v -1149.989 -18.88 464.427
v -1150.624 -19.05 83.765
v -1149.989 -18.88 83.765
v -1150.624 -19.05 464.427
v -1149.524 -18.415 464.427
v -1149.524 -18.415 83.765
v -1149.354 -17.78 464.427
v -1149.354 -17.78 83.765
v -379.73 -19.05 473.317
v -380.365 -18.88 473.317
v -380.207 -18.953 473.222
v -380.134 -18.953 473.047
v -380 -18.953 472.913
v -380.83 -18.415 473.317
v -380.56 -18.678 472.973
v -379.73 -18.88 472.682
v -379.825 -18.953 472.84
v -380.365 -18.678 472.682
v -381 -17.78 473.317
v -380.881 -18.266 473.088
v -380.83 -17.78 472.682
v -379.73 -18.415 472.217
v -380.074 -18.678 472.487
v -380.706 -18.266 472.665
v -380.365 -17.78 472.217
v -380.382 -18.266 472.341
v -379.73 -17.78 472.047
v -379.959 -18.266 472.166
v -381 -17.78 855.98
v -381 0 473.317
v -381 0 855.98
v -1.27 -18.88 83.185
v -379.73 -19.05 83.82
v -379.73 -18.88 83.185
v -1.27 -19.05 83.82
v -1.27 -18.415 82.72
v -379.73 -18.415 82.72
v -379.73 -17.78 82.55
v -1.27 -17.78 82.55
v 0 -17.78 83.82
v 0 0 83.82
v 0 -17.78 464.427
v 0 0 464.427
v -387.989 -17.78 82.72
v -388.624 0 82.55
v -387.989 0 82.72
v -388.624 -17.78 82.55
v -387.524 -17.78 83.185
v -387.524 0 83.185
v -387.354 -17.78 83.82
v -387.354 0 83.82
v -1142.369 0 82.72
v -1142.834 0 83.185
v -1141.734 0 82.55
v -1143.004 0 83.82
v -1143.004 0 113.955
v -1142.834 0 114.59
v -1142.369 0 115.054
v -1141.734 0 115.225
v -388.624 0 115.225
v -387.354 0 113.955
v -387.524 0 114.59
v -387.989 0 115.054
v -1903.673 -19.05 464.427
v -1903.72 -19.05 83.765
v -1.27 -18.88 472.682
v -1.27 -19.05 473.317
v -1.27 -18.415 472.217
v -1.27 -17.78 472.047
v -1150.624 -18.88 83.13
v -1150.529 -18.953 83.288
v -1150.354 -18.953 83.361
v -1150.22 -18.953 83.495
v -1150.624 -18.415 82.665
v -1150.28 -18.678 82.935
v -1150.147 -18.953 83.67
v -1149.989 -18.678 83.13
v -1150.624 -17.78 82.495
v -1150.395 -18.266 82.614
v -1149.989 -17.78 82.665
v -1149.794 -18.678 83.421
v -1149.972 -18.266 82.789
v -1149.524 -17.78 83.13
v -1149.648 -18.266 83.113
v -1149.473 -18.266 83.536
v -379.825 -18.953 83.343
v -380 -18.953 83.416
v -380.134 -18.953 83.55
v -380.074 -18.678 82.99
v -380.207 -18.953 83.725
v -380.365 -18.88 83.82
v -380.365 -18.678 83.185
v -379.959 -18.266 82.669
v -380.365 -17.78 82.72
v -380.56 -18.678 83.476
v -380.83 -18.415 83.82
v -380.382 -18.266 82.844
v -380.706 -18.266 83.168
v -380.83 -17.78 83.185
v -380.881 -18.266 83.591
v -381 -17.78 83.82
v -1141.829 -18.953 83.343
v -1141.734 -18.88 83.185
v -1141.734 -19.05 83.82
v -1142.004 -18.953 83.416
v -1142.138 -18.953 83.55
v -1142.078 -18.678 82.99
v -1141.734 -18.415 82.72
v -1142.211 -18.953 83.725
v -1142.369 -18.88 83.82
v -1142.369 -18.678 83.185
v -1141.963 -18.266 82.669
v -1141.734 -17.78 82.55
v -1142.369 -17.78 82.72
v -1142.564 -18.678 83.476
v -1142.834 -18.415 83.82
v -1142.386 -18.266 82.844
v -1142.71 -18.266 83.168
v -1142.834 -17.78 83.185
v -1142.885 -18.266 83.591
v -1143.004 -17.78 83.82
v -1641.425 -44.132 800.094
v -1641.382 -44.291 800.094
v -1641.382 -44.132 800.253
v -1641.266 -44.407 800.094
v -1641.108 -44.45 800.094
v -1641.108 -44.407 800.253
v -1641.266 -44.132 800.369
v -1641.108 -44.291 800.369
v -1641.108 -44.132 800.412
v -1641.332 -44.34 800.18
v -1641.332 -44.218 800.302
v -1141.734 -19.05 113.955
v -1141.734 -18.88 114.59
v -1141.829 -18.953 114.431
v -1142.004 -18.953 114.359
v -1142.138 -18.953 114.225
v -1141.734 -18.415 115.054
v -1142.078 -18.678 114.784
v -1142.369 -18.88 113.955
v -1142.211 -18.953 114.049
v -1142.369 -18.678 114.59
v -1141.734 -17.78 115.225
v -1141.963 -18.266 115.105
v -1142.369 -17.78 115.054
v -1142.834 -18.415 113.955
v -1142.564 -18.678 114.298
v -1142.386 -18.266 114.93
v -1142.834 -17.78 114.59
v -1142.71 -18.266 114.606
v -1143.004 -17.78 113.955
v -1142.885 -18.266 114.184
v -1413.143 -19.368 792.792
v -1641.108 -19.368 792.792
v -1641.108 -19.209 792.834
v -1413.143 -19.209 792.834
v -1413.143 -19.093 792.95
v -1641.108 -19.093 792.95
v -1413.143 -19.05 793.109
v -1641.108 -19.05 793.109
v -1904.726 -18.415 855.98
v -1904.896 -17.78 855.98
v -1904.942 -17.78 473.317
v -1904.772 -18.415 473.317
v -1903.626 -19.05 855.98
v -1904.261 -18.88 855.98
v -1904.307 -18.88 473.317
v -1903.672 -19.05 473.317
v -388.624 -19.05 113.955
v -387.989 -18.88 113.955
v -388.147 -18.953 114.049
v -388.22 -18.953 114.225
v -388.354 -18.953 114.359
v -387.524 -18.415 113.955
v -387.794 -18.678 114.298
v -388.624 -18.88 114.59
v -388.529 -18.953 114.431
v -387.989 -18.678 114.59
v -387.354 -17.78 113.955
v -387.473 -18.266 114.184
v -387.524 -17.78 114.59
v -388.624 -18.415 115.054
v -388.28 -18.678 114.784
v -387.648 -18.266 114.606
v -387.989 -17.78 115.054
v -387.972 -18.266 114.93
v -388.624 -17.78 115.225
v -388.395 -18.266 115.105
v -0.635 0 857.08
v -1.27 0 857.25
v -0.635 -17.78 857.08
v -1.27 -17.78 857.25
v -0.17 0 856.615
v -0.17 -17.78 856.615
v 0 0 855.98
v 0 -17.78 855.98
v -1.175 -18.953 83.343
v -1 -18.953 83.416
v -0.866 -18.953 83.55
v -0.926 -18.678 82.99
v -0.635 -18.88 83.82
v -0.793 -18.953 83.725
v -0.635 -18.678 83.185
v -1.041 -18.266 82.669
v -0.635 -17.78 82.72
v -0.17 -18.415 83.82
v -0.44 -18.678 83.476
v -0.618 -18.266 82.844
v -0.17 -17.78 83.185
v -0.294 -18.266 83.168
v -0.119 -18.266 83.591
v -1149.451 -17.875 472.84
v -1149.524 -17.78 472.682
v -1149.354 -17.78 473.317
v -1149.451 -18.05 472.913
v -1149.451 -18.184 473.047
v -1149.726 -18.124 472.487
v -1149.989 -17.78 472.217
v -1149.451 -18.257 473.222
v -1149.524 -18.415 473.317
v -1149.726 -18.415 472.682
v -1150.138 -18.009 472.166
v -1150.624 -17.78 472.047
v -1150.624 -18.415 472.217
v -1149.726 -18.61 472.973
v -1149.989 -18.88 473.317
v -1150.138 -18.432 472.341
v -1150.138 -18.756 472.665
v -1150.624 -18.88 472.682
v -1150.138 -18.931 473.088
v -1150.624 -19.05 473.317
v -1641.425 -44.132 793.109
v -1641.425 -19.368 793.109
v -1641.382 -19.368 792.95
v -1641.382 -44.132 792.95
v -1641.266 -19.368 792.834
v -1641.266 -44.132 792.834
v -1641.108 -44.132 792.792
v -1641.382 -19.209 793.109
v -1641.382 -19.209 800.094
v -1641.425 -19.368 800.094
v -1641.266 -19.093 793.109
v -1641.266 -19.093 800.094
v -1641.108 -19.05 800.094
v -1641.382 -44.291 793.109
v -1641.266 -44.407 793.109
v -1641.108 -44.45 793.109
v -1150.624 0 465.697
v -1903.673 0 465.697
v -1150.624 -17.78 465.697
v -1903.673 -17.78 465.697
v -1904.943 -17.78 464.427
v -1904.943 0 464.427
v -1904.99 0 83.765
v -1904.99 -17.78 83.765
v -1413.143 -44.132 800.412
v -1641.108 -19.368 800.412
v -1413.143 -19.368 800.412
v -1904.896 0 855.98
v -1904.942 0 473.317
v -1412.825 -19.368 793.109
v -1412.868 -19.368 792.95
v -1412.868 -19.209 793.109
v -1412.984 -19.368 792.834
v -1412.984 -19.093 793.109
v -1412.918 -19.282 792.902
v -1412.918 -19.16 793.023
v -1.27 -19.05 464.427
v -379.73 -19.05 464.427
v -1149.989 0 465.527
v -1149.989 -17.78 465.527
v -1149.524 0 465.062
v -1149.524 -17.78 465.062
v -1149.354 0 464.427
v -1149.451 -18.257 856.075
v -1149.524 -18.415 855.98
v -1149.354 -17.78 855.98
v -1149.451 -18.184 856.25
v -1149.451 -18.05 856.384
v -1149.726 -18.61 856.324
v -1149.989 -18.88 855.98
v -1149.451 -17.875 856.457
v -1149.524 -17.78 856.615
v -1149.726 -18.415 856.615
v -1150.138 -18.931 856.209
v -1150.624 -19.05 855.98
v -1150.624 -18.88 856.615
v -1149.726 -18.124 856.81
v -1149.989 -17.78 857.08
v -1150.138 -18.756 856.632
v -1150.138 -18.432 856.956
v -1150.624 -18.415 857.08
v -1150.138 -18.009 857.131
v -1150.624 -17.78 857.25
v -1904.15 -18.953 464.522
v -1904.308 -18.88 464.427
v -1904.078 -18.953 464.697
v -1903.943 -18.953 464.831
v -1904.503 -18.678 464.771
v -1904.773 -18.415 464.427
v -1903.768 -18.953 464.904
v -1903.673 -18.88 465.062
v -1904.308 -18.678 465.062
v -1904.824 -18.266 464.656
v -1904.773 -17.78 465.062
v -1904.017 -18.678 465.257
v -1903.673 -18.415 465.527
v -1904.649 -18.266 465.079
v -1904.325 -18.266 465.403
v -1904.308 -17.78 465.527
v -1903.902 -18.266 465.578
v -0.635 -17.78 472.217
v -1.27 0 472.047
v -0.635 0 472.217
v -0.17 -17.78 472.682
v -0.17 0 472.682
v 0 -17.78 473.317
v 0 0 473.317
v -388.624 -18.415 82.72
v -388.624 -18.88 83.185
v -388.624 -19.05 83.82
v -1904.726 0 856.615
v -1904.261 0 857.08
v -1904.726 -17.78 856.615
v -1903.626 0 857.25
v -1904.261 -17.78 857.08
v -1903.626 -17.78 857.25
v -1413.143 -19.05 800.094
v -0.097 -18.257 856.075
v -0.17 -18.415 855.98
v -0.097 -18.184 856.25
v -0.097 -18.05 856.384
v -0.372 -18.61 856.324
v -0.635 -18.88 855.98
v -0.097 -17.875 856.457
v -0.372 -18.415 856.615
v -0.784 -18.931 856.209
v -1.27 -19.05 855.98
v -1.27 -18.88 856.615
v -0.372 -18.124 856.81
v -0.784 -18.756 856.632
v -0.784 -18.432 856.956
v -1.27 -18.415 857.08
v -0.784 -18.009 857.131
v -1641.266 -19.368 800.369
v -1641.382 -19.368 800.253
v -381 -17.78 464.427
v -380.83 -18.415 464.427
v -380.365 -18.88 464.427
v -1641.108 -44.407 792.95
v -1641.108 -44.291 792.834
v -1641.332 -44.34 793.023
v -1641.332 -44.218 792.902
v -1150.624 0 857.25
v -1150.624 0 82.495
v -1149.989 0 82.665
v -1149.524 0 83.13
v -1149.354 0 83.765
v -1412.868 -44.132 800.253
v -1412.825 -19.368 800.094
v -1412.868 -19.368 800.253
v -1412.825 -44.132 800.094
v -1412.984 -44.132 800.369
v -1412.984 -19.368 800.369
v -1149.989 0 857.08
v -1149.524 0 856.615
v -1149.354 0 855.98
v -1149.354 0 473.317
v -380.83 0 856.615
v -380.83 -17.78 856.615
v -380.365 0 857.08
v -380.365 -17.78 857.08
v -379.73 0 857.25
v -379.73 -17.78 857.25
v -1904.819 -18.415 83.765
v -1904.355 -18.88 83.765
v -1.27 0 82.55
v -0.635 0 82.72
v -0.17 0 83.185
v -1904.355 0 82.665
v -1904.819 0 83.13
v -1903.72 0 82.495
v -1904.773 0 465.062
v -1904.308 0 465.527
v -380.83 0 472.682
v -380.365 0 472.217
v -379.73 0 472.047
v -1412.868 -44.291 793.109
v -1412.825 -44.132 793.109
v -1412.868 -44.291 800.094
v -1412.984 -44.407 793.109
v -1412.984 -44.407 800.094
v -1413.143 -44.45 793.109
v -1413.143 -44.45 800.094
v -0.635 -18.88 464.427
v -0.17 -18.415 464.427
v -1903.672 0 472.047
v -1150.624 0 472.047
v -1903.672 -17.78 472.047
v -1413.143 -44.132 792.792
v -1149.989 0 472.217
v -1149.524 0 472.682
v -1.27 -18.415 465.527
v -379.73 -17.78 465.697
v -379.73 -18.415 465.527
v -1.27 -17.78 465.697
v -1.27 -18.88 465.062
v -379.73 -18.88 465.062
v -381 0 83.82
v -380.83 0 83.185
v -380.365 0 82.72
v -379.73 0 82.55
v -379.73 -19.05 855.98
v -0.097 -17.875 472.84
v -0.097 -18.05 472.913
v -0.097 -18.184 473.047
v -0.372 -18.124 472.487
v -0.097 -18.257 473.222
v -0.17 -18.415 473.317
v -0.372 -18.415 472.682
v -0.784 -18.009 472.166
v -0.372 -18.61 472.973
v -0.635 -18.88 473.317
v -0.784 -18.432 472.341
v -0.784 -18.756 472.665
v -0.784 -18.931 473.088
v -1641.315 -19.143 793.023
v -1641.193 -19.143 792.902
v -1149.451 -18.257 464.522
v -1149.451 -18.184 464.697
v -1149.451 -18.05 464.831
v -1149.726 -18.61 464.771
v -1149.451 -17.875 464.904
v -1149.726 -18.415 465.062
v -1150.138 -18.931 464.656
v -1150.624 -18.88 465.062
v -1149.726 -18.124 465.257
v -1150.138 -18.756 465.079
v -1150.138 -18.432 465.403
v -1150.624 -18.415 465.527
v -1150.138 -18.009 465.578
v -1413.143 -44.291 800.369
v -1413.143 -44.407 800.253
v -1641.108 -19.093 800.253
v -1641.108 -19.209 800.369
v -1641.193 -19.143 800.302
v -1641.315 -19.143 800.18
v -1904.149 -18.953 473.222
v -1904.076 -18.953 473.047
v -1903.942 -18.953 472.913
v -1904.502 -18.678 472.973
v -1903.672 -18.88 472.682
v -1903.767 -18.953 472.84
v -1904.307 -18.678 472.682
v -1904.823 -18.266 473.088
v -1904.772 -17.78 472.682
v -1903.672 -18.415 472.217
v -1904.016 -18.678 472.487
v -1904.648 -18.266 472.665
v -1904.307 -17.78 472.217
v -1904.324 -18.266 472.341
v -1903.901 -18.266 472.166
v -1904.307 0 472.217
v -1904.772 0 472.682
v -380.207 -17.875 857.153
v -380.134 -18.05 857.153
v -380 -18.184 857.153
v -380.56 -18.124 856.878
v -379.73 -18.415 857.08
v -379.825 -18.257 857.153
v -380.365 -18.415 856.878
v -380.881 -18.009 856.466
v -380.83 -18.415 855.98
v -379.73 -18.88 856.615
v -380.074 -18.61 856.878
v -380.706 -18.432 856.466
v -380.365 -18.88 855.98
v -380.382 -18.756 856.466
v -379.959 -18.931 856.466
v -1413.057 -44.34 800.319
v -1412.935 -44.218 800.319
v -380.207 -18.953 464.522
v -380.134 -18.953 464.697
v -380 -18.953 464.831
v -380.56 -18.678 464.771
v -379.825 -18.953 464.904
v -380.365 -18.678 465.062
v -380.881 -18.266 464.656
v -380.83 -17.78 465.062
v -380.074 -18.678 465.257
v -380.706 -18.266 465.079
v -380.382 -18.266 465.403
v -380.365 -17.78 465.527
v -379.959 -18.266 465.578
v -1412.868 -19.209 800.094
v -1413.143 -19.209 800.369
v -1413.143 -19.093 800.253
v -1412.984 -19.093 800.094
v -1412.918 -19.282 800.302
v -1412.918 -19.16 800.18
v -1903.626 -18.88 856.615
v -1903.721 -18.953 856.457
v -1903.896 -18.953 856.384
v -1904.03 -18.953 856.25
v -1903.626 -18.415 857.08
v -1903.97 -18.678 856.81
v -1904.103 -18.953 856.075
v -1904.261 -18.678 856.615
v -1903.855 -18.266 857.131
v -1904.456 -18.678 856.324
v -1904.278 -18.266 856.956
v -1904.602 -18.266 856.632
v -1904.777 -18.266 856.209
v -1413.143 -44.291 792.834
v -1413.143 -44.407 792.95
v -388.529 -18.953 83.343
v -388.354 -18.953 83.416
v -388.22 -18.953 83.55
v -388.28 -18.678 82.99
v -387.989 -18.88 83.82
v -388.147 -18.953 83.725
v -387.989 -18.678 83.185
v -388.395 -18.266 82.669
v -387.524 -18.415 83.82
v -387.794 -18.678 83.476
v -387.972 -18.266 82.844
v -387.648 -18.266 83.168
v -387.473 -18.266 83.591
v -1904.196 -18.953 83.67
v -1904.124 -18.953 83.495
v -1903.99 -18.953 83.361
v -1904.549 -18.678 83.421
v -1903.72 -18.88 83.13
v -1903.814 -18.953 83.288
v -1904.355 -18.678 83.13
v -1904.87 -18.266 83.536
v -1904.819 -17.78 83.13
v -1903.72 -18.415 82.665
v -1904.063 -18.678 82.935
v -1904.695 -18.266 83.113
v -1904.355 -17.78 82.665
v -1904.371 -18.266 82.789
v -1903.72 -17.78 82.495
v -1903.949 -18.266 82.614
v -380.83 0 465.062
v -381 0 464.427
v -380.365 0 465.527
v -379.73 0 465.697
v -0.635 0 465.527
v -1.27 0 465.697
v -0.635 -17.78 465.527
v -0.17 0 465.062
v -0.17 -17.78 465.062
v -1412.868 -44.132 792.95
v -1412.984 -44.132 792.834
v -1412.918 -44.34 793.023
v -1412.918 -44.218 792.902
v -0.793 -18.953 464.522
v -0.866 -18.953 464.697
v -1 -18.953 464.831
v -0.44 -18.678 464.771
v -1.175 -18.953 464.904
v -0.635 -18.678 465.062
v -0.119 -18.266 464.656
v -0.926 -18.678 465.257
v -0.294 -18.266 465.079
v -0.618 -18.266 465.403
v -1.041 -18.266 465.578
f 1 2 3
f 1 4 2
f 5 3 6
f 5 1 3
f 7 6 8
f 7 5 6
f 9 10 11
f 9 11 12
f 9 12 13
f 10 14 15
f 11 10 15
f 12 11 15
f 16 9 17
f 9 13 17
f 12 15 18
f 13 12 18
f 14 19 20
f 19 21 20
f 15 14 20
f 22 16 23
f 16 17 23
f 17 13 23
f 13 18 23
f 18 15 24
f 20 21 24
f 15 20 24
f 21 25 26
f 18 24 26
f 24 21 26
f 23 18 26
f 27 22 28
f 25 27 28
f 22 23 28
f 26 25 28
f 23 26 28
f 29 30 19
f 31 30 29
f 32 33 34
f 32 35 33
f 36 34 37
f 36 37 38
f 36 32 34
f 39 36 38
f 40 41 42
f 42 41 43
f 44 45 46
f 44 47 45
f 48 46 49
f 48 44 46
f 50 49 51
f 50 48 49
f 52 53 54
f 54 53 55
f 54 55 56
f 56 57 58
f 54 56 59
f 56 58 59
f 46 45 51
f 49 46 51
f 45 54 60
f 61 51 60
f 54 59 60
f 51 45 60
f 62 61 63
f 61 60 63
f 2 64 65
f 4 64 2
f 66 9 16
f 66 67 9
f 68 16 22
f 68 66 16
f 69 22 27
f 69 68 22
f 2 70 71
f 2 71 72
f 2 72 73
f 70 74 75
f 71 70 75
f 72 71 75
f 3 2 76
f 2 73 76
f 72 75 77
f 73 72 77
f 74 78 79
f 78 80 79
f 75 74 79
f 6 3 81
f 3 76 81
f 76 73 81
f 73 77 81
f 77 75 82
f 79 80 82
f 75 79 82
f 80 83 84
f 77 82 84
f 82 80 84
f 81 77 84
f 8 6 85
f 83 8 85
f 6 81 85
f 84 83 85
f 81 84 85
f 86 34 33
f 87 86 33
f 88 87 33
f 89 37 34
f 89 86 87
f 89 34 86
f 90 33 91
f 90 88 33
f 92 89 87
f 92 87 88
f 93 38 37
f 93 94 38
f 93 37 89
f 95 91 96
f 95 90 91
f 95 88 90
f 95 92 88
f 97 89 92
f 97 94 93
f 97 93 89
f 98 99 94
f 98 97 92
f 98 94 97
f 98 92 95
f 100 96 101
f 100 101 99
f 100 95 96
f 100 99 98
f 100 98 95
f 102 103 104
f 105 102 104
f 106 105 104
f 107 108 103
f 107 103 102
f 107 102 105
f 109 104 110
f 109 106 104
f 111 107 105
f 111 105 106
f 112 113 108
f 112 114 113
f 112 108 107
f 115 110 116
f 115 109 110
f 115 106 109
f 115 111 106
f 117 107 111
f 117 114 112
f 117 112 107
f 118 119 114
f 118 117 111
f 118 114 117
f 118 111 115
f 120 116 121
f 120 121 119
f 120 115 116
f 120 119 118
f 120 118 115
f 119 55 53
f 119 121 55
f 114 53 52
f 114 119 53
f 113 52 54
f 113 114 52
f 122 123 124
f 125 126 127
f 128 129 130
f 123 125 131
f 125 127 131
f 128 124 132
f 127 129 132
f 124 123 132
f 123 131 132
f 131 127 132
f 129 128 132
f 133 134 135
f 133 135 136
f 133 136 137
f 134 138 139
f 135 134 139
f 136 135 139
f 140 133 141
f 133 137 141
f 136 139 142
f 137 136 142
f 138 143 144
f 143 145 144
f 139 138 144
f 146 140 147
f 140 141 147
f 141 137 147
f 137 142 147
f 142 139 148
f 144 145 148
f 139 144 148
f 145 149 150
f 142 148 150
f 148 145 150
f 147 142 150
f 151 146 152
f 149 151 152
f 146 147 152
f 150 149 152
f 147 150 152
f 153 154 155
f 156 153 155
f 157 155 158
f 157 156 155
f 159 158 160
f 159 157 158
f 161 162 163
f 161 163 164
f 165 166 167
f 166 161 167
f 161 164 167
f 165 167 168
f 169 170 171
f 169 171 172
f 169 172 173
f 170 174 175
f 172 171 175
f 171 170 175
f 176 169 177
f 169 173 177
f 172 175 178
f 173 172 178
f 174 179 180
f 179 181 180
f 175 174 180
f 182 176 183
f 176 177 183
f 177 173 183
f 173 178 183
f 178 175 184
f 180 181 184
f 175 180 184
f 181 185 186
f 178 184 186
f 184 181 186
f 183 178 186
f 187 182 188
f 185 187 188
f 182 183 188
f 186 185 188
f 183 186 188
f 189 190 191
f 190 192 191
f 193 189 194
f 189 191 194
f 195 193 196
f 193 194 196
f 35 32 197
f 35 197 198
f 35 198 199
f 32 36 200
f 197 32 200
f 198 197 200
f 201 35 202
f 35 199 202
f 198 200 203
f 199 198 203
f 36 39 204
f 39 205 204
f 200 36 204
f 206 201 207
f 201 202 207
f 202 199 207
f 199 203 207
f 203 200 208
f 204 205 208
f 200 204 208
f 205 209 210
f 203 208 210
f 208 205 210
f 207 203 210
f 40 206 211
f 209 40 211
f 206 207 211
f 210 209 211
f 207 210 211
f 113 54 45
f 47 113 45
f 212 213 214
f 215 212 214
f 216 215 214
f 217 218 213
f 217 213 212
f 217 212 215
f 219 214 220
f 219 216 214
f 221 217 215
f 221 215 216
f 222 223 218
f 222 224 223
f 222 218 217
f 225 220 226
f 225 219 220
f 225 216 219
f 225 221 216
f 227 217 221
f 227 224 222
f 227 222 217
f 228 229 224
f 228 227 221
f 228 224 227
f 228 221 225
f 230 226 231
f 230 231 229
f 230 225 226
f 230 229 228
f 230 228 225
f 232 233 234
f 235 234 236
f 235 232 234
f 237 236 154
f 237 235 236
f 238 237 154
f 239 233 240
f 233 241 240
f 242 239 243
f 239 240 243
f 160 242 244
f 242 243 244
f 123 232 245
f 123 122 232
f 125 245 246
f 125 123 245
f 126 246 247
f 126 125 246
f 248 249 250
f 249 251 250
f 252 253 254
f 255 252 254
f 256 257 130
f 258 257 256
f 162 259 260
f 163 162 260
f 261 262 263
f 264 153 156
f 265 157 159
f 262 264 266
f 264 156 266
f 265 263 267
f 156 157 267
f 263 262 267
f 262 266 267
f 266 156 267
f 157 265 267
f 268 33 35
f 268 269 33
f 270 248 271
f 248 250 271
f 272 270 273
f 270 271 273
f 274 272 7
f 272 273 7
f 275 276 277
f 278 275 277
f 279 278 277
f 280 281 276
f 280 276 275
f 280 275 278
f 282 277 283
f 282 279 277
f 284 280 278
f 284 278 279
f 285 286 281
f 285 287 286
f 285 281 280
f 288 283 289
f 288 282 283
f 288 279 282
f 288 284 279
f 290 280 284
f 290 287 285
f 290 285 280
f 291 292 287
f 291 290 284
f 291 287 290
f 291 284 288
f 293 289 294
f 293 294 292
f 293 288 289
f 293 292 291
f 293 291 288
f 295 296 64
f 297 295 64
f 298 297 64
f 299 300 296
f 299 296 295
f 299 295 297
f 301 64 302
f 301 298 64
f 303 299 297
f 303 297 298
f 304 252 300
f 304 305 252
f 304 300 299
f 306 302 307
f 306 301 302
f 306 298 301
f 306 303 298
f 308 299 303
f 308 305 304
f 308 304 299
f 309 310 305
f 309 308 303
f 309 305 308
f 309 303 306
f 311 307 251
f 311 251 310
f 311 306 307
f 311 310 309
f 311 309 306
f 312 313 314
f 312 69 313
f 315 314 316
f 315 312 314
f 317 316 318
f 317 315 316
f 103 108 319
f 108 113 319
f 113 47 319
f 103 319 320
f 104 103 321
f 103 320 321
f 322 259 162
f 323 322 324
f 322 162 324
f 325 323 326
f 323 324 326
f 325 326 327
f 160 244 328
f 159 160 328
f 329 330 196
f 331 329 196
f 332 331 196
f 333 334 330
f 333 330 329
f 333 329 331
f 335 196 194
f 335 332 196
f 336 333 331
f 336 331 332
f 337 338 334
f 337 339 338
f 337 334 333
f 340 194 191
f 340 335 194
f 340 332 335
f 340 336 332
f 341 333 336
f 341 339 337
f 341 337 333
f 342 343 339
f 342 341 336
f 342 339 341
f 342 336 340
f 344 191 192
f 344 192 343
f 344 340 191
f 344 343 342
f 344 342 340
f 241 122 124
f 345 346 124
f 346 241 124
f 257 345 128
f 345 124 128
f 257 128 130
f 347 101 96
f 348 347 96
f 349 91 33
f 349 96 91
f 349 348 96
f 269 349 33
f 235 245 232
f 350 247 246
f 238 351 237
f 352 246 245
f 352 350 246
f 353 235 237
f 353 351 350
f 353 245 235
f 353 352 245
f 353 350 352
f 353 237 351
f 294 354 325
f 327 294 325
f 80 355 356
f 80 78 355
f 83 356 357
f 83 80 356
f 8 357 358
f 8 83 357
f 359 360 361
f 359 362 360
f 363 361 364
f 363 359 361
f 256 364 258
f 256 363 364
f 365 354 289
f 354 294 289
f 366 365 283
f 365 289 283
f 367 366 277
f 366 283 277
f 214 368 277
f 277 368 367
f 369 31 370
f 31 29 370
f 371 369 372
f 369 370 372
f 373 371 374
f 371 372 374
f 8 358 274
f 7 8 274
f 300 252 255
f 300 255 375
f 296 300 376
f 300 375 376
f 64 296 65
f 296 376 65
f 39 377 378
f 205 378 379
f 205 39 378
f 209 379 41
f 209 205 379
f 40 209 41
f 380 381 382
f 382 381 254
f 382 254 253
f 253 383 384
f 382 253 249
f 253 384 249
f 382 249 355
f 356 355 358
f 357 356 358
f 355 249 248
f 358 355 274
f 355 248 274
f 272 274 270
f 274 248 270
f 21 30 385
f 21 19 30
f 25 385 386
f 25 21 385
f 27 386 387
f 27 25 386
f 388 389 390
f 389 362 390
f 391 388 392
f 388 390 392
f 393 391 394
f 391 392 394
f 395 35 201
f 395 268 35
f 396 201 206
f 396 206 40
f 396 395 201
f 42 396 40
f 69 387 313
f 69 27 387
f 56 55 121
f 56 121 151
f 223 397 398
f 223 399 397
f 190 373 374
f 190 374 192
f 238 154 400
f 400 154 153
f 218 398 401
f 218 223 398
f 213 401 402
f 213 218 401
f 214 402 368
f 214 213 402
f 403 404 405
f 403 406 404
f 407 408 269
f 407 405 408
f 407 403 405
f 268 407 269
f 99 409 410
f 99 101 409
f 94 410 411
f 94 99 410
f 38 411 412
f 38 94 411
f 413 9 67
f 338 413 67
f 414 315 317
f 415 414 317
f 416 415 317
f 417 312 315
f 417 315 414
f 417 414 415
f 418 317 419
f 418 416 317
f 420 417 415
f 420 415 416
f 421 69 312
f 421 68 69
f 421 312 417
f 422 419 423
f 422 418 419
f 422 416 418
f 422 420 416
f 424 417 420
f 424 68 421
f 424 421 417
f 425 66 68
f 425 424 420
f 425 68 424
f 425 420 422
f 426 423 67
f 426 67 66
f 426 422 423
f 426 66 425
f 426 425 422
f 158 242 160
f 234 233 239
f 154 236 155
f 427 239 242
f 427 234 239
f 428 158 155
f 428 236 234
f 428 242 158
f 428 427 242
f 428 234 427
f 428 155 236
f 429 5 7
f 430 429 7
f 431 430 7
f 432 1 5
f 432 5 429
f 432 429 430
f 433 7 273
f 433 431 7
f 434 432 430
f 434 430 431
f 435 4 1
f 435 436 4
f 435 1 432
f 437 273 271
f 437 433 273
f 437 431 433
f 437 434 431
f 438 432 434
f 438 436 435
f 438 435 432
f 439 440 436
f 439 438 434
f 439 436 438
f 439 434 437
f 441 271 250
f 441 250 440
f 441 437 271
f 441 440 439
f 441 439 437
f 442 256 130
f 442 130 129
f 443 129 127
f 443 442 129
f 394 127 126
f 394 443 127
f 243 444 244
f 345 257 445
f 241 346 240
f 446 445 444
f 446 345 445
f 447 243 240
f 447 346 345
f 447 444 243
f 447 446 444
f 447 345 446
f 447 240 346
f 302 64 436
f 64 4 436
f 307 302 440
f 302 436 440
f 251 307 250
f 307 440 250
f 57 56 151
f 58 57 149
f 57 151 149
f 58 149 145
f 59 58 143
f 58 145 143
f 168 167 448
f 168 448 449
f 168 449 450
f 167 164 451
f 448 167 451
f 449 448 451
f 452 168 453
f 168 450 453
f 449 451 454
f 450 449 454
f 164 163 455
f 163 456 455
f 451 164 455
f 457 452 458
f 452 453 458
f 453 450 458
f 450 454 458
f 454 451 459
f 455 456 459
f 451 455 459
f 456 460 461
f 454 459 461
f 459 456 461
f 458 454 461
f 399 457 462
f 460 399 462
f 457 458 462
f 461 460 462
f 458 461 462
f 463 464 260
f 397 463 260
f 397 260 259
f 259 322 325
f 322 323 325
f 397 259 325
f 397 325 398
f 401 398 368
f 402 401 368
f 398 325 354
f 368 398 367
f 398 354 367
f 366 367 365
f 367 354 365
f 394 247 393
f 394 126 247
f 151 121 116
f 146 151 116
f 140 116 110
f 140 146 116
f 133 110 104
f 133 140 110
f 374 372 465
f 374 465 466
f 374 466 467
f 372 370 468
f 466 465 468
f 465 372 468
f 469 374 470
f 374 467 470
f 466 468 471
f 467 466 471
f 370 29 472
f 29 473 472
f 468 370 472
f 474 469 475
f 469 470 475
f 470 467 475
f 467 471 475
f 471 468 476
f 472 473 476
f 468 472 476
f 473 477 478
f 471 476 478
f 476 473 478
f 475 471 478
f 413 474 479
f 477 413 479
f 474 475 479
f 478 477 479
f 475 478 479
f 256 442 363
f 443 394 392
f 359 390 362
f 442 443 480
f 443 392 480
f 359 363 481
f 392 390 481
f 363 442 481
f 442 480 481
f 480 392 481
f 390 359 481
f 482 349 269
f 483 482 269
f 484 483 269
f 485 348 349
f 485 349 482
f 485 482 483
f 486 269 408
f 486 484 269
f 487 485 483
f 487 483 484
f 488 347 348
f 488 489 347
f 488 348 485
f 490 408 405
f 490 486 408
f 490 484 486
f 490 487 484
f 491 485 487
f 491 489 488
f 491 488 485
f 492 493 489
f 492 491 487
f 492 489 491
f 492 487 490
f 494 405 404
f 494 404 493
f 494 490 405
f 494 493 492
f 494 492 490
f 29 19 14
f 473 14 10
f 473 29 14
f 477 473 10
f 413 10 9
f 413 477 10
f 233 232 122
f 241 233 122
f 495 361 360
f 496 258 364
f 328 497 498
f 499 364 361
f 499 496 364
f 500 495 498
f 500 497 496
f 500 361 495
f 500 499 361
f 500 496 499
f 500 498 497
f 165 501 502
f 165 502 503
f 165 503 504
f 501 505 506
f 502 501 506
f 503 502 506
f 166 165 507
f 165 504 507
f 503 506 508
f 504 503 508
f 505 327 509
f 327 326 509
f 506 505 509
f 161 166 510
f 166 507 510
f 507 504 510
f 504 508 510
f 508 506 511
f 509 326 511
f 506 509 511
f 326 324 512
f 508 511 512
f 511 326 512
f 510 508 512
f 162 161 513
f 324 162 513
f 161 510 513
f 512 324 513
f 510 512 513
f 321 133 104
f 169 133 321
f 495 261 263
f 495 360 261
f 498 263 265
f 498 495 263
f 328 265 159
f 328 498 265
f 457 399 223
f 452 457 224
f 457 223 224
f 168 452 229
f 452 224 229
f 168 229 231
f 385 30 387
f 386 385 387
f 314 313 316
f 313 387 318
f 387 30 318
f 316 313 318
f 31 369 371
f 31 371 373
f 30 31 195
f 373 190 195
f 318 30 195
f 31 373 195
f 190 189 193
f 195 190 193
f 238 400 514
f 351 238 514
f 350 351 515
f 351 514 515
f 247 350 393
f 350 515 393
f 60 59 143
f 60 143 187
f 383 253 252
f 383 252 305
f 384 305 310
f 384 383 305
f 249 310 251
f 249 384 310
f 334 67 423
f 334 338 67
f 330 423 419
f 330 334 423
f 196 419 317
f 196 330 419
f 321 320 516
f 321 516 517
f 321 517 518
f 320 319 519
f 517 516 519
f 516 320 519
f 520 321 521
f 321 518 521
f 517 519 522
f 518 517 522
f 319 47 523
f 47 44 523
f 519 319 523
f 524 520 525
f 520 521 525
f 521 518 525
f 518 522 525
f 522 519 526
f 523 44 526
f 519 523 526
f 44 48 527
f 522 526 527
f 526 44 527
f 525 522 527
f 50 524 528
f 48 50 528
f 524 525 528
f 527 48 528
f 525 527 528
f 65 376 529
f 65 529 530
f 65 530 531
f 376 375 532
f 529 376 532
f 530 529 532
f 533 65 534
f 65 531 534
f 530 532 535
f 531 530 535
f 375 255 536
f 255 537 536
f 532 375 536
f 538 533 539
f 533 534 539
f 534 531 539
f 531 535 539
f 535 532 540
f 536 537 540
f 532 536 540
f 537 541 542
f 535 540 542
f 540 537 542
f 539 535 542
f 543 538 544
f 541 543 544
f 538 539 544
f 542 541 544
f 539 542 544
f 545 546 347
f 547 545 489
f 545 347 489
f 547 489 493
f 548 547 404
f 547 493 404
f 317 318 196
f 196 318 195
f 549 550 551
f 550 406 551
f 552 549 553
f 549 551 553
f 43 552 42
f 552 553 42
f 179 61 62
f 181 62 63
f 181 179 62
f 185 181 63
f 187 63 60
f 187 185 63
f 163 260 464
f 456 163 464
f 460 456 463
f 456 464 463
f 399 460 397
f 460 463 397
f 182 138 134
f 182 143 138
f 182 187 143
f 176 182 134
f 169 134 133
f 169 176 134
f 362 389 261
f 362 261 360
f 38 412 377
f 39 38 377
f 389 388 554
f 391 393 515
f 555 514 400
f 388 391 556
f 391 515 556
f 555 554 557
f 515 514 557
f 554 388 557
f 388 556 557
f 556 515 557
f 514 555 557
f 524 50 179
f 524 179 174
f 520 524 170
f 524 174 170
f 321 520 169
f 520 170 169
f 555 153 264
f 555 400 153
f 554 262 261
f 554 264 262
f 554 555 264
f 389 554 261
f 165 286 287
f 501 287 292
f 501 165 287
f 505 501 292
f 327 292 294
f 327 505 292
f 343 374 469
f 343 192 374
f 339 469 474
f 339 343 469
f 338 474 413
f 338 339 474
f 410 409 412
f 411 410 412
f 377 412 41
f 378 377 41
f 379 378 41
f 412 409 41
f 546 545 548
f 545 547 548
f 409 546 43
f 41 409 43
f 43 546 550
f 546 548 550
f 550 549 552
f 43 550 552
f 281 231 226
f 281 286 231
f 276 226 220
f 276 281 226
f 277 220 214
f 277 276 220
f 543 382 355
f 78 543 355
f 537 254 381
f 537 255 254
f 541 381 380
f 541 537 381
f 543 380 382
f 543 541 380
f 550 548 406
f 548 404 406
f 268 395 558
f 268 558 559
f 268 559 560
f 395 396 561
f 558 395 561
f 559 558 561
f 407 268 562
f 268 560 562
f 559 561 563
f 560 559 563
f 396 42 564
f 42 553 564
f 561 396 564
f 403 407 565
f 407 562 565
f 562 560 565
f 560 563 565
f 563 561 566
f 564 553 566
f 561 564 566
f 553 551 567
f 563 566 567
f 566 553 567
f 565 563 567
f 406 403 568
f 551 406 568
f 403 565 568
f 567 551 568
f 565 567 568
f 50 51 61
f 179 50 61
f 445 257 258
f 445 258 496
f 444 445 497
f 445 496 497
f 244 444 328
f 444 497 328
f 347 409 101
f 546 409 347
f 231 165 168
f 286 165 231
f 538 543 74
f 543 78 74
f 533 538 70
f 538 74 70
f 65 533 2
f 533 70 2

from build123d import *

# Parameters (mm, degrees)
F0_W     = 381
F0_H     = 774.7
F1_DEPTH = 19.05
F0_W_2   = 755.65
F0_H_2   = 32.6746147394
F3_W     = 228.6
F3_H     = 7.62
F4_DEPTH = 25.4
F5_R     = 0.3175
F6_W     = 2032
F6_H     = 6.35
F7_DEPTH = 25.4
F8_R     = 1.27
F8_2_R   = 1.27
F8_3_R   = 1.27


# Not quite as in the source:
# - a feature of the source that left no trace in its solid (it failed there, or was rolled back) is left out


with BuildPart() as f1:
    # F0 (on Front) → F1 (new body)
    with BuildSketch(Plane.XZ):
        with Locations((-190.5, 469.9)):
            Rectangle(F0_W, F0_H)
    extrude(amount=F1_DEPTH)


with BuildPart() as f1b:
    # F0 (on Front) → F1, piece 2 (new body)
    with BuildSketch(Plane.XZ):
        Polygon((-1904.895815666, 857.25), (-1904.9897383738, 82.4946576853), (-1149.3540530003, 82.4946576853), (-1149.3540530003, 82.55), (-1149.3540530003, 857.25), (-1527.1790530003, 857.25), align=None)
    extrude(amount=F1_DEPTH)


with BuildPart() as f1c:
    # F0 (on Front) → F1, piece 3 (new body)
    with BuildSketch(Plane.XZ):
        with Locations((-765.1790530003, 98.8873073697)):
            Rectangle(F0_W_2, F0_H_2)
    extrude(amount=F1_DEPTH)

    # F8#3
    f8_3_edges = [f1c.edges().sort_by_distance(p)[0] for p in [
        (-1143.004053, -9.525, 82.55),
        (-387.354053, -9.525, 82.55),
        (-765.179053, -19.05, 82.55),
        (-387.354053, -9.525, 115.224615),
        (-387.354053, -19.05, 98.887307),
        (-1143.004053, -9.525, 115.224615),
        (-765.179053, -19.05, 115.224615),
        (-1143.004053, -19.05, 98.887307),
    ]]
    fillet(f8_3_edges, radius=F8_3_R)


with BuildPart() as f4:
    # F3 (on face) → F4 (new body)
    with BuildSketch(Plane.XZ.offset(19.05)):
        with Locations((-1527.1250113088, 796.6017127037)):
            Rectangle(F3_W, F3_H)
    extrude(amount=F4_DEPTH)

    # F5
    f5_edges = [f4.edges().sort_by_distance(p)[0] for p in [
        (-1527.125011, -44.45, 792.791713),
        (-1412.825011, -44.45, 796.601713),
        (-1527.125011, -44.45, 800.411713),
        (-1641.425011, -44.45, 796.601713),
        (-1641.425011, -31.75, 800.411713),
        (-1641.425011, -31.75, 792.791713),
        (-1527.125011, -19.05, 800.411713),
        (-1641.425011, -19.05, 796.601713),
        (-1527.125011, -19.05, 792.791713),
        (-1412.825011, -31.75, 792.791713),
        (-1412.825011, -31.75, 800.411713),
        (-1412.825011, -19.05, 796.601713),
    ]]
    fillet(f5_edges, radius=F5_R)


with BuildPart() as f7_tool:
    # F6 (on face) → F7 (new body)
    with BuildSketch(Plane.XZ.offset(19.05)):
        with Locations((-895.2655443497, 468.8719840575)):
            Rectangle(F6_W, F6_H)
    extrude(amount=-F7_DEPTH)


with BuildPart() as f1_1:
    add(f1.part)

    # F7: cut by f7_tool
    add(f7_tool.part, mode=Mode.SUBTRACT)

    # F8
    f8_edges = [f1_1.edges().sort_by_distance(p)[0] for p in [
        (-381, -9.525, 472.046984),
        (-381, -9.525, 465.696984),
        (-381, -9.525, 82.55),
        (0, -9.525, 82.55),
        (-190.5, -19.05, 82.55),
        (-381, -19.05, 274.123492),
        (0, -9.525, 465.696984),
        (0, -19.05, 274.123492),
        (-190.5, -19.05, 465.696984),
        (-381, -19.05, 664.648492),
        (-381, -9.525, 857.25),
        (-190.5, -19.05, 472.046984),
        (0, -9.525, 472.046984),
        (-190.5, -19.05, 857.25),
        (0, -19.05, 664.648492),
        (0, -9.525, 857.25),
    ]]
    fillet(f8_edges, radius=F8_R)


with BuildPart() as f1b_1:
    add(f1b.part)

    # F7: cut by f7_tool
    add(f7_tool.part, mode=Mode.SUBTRACT)

    # F8#2
    f8_2_edges = [f1b_1.edges().sort_by_distance(p)[0] for p in [
        (-1904.942513, -9.525, 472.046984),
        (-1904.943283, -9.525, 465.696984),
        (-1904.919165, -19.05, 664.648492),
        (-1904.895816, -9.525, 857.25),
        (-1527.148283, -19.05, 472.046984),
        (-1149.354053, -9.525, 472.046984),
        (-1527.124934, -19.05, 857.25),
        (-1149.354053, -19.05, 664.648492),
        (-1149.354053, -9.525, 857.25),
        (-1904.989738, -9.525, 82.494658),
        (-1904.966511, -19.05, 274.095821),
        (-1149.354053, -9.525, 82.494658),
        (-1527.171896, -19.05, 82.494658),
        (-1527.148668, -19.05, 465.696984),
        (-1149.354053, -19.05, 274.095821),
        (-1149.354053, -9.525, 465.696984),
    ]]
    fillet(f8_2_edges, radius=F8_2_R)


solid = Compound([f1c.part, f4.part, f1_1.part, f1b_1.part])
